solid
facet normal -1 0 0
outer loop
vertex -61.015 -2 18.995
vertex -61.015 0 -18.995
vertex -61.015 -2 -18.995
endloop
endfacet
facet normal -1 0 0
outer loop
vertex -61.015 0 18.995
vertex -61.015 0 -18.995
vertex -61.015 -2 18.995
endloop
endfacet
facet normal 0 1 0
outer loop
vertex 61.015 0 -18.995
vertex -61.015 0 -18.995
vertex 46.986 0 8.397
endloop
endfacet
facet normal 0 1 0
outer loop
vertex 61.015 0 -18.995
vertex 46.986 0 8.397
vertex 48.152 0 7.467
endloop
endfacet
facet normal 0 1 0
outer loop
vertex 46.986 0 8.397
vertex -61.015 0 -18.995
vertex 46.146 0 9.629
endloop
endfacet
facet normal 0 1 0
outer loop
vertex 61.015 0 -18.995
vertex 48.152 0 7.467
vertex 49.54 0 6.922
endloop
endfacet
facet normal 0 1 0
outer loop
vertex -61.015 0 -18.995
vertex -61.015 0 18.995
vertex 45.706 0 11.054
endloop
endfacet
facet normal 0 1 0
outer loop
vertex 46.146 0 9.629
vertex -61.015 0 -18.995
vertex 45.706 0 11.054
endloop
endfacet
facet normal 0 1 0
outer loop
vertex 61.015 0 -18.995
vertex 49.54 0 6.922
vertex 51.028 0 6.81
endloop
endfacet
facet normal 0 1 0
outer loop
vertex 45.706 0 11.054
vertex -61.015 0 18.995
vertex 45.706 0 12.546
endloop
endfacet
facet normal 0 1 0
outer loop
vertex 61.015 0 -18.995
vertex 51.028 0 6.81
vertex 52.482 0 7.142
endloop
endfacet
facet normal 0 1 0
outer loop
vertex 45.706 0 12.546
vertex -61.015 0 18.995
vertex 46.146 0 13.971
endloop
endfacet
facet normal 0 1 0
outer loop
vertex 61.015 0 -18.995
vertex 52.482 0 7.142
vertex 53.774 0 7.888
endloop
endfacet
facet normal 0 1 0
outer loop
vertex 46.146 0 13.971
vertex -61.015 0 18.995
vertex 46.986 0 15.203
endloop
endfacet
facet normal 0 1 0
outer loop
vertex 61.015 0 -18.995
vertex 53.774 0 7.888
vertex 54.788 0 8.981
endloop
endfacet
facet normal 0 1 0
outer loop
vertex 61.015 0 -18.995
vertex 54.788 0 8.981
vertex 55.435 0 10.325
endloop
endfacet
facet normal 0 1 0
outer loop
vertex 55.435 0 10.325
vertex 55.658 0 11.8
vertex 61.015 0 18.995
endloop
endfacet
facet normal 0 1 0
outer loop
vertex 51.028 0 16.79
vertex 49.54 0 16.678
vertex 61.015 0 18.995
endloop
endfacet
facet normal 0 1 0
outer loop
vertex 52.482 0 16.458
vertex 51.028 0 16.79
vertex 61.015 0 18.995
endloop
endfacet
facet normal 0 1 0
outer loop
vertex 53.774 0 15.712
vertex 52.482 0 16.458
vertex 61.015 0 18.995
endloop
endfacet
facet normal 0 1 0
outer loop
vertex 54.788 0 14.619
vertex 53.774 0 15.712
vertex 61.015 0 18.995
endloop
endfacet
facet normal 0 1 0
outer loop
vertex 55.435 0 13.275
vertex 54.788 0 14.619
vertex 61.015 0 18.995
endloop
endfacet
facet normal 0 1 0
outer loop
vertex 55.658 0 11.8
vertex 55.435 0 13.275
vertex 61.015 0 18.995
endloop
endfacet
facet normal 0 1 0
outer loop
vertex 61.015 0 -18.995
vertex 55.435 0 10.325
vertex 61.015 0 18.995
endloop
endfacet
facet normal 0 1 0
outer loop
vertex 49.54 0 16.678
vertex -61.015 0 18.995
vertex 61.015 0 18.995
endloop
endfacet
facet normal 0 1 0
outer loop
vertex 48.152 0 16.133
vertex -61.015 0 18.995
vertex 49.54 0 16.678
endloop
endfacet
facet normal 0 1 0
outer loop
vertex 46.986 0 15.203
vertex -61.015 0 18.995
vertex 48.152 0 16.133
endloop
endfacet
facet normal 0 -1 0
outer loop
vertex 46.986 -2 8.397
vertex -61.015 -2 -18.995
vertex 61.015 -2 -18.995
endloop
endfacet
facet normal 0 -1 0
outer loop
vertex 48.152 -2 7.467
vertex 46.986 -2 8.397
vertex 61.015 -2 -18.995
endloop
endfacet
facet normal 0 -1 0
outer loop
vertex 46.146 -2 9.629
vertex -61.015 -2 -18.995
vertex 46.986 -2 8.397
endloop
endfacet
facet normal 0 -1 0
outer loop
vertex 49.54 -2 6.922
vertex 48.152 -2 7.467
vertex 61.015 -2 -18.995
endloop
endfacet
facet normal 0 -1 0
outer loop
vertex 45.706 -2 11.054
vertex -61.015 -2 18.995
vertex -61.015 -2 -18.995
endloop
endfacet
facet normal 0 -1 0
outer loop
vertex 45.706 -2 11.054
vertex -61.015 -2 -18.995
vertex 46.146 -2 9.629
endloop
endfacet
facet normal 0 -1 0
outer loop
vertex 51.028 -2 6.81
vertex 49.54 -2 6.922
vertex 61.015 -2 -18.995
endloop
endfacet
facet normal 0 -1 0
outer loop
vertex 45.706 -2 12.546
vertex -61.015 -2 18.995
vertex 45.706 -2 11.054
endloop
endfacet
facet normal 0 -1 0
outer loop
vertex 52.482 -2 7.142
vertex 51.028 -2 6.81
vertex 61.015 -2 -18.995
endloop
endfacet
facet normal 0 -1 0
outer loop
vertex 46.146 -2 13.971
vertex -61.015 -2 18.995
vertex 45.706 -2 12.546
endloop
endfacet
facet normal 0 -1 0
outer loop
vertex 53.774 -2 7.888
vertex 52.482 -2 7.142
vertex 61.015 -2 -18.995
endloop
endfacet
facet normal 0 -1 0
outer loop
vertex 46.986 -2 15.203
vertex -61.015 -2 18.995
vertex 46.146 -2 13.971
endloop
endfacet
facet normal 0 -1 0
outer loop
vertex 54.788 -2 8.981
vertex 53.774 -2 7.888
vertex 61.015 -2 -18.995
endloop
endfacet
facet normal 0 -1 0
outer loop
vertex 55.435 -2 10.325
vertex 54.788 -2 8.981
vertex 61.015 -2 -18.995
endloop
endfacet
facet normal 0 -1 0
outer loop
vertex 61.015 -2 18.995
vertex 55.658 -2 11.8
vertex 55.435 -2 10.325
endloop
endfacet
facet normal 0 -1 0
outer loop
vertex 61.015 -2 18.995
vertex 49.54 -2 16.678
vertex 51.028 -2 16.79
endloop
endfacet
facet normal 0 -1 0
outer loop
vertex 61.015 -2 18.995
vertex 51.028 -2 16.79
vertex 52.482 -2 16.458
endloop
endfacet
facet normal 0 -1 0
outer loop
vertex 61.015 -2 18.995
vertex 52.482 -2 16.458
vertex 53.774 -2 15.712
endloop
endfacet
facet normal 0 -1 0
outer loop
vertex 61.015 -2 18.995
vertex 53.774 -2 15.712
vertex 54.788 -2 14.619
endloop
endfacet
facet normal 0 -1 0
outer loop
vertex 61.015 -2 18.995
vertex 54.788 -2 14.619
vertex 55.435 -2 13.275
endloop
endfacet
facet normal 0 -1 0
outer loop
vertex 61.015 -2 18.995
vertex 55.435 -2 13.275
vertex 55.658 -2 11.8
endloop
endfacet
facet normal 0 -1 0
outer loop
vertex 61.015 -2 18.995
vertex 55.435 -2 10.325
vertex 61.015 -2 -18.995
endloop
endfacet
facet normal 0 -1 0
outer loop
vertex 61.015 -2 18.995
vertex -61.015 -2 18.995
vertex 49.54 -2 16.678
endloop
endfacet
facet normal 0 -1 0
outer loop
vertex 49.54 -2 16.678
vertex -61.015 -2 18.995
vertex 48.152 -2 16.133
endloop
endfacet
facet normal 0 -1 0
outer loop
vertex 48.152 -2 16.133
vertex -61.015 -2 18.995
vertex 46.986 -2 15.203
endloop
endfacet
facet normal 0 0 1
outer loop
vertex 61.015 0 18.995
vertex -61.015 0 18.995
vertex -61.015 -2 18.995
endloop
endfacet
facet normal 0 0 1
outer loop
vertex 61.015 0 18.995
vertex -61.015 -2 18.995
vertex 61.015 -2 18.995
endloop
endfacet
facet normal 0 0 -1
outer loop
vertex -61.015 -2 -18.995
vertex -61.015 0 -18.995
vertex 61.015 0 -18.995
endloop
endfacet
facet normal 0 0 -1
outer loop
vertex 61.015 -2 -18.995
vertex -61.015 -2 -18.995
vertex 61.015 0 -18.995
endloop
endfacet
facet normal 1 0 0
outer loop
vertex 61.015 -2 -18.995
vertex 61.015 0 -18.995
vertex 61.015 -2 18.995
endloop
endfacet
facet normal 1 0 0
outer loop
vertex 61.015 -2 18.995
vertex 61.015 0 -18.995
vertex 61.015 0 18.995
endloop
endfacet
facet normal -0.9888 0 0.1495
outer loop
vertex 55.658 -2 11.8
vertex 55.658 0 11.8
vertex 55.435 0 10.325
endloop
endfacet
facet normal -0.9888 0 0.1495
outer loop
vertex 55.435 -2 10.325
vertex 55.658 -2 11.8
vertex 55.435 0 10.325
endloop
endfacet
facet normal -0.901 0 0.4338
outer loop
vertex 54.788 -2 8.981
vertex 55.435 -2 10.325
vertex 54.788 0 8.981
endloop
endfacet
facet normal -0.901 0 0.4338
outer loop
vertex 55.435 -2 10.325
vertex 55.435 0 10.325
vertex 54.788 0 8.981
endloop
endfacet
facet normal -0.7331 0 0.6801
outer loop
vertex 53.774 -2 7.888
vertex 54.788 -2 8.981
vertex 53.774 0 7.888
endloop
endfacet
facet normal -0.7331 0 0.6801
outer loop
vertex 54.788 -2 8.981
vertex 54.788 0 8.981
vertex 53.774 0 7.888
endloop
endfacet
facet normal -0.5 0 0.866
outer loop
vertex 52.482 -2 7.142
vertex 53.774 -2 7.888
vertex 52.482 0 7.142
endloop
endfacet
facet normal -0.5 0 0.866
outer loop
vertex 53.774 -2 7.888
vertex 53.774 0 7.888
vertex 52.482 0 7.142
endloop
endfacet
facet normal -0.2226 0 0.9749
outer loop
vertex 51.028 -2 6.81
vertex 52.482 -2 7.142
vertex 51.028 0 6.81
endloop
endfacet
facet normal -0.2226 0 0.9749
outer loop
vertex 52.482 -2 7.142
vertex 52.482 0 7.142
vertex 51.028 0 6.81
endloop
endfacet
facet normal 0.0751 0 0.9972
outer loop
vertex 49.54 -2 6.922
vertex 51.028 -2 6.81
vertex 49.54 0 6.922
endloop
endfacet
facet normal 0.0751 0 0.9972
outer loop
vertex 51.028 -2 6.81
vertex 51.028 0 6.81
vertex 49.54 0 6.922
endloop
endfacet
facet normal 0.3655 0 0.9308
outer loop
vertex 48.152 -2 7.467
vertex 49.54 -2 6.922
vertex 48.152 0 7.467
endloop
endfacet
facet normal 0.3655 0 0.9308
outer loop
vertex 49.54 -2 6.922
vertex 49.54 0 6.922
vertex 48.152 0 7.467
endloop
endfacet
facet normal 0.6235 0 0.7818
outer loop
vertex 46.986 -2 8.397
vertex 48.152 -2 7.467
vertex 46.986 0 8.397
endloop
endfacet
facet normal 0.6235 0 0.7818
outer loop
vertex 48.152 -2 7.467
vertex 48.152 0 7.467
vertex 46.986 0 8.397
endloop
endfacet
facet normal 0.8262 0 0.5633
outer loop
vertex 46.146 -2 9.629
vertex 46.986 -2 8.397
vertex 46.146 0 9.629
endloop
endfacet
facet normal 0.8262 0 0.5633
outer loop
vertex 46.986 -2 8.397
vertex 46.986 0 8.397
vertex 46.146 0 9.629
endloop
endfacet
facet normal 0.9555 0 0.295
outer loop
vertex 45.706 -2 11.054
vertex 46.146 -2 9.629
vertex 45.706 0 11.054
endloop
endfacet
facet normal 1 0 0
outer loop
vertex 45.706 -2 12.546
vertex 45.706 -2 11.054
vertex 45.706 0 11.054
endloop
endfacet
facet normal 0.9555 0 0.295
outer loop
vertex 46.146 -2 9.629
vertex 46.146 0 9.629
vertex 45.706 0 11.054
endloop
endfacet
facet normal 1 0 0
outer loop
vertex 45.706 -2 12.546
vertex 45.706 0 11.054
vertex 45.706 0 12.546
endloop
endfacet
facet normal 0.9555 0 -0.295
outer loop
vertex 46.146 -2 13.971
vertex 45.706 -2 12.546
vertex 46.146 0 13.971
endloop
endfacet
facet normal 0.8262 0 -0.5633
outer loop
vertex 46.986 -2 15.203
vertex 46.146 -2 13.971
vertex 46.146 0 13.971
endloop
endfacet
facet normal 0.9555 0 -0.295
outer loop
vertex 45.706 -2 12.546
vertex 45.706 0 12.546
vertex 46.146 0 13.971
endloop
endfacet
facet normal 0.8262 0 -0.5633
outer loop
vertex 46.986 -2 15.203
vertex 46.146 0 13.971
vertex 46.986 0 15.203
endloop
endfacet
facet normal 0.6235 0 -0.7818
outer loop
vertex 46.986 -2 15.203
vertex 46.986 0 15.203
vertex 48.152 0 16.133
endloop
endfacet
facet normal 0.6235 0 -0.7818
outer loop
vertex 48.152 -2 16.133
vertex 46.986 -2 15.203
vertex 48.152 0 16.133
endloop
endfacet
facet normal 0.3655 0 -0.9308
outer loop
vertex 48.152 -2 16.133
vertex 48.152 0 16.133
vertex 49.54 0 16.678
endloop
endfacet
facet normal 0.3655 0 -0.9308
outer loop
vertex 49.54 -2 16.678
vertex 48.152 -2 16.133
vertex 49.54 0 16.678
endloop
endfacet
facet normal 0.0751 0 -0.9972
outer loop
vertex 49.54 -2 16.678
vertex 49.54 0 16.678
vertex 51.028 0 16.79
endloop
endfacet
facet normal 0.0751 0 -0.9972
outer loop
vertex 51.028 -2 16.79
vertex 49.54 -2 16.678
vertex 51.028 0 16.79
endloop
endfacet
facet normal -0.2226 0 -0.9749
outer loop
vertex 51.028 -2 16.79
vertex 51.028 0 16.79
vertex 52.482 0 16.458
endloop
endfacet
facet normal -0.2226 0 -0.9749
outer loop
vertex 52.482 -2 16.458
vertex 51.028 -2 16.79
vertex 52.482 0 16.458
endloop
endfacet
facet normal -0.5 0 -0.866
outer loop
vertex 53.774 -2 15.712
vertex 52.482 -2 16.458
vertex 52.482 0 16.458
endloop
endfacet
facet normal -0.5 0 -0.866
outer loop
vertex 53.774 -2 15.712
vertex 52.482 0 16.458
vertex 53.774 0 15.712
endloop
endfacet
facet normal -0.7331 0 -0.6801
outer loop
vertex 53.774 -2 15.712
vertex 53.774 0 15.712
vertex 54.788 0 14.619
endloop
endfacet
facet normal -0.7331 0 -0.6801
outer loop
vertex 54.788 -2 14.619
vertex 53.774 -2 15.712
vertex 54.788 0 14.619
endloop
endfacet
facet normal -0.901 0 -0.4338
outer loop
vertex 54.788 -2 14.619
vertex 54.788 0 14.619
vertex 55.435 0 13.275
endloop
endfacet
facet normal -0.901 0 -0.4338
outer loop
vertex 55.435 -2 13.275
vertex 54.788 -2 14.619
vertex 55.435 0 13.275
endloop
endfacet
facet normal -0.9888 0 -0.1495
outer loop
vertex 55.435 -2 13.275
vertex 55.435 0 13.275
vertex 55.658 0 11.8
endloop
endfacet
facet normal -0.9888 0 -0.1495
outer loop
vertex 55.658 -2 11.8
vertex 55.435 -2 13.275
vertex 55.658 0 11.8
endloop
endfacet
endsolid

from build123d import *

# Parameters (mm, degrees)
F0_W           = 122.0296397805
F0_H           = 37.9903614521
F3_DEPTH       = 2
F5_D           = 10
F5_CBORE_D     = 10.0076
F5_CBORE_DEPTH = 5


# Not quite as in the source:
# - the program builds the solid bodies; features that only make, move or delete a surface that nothing else refers to are left out


with BuildPart() as f3:
    # F0 (on Front) → F3 (new body)
    with BuildSketch(Plane.XZ):
        Rectangle(F0_W, F0_H)
    extrude(amount=F3_DEPTH)

    # F5 (through all)
    with Locations(Plane(origin=(0, 0, 0), x_dir=(1, 0, 0), z_dir=(0, 1, 0))):
        with Locations((50.6538115442, -11.8000358343)):
            CounterBoreHole(F5_D / 2, F5_CBORE_D / 2, F5_CBORE_DEPTH)


solid = f3.part
